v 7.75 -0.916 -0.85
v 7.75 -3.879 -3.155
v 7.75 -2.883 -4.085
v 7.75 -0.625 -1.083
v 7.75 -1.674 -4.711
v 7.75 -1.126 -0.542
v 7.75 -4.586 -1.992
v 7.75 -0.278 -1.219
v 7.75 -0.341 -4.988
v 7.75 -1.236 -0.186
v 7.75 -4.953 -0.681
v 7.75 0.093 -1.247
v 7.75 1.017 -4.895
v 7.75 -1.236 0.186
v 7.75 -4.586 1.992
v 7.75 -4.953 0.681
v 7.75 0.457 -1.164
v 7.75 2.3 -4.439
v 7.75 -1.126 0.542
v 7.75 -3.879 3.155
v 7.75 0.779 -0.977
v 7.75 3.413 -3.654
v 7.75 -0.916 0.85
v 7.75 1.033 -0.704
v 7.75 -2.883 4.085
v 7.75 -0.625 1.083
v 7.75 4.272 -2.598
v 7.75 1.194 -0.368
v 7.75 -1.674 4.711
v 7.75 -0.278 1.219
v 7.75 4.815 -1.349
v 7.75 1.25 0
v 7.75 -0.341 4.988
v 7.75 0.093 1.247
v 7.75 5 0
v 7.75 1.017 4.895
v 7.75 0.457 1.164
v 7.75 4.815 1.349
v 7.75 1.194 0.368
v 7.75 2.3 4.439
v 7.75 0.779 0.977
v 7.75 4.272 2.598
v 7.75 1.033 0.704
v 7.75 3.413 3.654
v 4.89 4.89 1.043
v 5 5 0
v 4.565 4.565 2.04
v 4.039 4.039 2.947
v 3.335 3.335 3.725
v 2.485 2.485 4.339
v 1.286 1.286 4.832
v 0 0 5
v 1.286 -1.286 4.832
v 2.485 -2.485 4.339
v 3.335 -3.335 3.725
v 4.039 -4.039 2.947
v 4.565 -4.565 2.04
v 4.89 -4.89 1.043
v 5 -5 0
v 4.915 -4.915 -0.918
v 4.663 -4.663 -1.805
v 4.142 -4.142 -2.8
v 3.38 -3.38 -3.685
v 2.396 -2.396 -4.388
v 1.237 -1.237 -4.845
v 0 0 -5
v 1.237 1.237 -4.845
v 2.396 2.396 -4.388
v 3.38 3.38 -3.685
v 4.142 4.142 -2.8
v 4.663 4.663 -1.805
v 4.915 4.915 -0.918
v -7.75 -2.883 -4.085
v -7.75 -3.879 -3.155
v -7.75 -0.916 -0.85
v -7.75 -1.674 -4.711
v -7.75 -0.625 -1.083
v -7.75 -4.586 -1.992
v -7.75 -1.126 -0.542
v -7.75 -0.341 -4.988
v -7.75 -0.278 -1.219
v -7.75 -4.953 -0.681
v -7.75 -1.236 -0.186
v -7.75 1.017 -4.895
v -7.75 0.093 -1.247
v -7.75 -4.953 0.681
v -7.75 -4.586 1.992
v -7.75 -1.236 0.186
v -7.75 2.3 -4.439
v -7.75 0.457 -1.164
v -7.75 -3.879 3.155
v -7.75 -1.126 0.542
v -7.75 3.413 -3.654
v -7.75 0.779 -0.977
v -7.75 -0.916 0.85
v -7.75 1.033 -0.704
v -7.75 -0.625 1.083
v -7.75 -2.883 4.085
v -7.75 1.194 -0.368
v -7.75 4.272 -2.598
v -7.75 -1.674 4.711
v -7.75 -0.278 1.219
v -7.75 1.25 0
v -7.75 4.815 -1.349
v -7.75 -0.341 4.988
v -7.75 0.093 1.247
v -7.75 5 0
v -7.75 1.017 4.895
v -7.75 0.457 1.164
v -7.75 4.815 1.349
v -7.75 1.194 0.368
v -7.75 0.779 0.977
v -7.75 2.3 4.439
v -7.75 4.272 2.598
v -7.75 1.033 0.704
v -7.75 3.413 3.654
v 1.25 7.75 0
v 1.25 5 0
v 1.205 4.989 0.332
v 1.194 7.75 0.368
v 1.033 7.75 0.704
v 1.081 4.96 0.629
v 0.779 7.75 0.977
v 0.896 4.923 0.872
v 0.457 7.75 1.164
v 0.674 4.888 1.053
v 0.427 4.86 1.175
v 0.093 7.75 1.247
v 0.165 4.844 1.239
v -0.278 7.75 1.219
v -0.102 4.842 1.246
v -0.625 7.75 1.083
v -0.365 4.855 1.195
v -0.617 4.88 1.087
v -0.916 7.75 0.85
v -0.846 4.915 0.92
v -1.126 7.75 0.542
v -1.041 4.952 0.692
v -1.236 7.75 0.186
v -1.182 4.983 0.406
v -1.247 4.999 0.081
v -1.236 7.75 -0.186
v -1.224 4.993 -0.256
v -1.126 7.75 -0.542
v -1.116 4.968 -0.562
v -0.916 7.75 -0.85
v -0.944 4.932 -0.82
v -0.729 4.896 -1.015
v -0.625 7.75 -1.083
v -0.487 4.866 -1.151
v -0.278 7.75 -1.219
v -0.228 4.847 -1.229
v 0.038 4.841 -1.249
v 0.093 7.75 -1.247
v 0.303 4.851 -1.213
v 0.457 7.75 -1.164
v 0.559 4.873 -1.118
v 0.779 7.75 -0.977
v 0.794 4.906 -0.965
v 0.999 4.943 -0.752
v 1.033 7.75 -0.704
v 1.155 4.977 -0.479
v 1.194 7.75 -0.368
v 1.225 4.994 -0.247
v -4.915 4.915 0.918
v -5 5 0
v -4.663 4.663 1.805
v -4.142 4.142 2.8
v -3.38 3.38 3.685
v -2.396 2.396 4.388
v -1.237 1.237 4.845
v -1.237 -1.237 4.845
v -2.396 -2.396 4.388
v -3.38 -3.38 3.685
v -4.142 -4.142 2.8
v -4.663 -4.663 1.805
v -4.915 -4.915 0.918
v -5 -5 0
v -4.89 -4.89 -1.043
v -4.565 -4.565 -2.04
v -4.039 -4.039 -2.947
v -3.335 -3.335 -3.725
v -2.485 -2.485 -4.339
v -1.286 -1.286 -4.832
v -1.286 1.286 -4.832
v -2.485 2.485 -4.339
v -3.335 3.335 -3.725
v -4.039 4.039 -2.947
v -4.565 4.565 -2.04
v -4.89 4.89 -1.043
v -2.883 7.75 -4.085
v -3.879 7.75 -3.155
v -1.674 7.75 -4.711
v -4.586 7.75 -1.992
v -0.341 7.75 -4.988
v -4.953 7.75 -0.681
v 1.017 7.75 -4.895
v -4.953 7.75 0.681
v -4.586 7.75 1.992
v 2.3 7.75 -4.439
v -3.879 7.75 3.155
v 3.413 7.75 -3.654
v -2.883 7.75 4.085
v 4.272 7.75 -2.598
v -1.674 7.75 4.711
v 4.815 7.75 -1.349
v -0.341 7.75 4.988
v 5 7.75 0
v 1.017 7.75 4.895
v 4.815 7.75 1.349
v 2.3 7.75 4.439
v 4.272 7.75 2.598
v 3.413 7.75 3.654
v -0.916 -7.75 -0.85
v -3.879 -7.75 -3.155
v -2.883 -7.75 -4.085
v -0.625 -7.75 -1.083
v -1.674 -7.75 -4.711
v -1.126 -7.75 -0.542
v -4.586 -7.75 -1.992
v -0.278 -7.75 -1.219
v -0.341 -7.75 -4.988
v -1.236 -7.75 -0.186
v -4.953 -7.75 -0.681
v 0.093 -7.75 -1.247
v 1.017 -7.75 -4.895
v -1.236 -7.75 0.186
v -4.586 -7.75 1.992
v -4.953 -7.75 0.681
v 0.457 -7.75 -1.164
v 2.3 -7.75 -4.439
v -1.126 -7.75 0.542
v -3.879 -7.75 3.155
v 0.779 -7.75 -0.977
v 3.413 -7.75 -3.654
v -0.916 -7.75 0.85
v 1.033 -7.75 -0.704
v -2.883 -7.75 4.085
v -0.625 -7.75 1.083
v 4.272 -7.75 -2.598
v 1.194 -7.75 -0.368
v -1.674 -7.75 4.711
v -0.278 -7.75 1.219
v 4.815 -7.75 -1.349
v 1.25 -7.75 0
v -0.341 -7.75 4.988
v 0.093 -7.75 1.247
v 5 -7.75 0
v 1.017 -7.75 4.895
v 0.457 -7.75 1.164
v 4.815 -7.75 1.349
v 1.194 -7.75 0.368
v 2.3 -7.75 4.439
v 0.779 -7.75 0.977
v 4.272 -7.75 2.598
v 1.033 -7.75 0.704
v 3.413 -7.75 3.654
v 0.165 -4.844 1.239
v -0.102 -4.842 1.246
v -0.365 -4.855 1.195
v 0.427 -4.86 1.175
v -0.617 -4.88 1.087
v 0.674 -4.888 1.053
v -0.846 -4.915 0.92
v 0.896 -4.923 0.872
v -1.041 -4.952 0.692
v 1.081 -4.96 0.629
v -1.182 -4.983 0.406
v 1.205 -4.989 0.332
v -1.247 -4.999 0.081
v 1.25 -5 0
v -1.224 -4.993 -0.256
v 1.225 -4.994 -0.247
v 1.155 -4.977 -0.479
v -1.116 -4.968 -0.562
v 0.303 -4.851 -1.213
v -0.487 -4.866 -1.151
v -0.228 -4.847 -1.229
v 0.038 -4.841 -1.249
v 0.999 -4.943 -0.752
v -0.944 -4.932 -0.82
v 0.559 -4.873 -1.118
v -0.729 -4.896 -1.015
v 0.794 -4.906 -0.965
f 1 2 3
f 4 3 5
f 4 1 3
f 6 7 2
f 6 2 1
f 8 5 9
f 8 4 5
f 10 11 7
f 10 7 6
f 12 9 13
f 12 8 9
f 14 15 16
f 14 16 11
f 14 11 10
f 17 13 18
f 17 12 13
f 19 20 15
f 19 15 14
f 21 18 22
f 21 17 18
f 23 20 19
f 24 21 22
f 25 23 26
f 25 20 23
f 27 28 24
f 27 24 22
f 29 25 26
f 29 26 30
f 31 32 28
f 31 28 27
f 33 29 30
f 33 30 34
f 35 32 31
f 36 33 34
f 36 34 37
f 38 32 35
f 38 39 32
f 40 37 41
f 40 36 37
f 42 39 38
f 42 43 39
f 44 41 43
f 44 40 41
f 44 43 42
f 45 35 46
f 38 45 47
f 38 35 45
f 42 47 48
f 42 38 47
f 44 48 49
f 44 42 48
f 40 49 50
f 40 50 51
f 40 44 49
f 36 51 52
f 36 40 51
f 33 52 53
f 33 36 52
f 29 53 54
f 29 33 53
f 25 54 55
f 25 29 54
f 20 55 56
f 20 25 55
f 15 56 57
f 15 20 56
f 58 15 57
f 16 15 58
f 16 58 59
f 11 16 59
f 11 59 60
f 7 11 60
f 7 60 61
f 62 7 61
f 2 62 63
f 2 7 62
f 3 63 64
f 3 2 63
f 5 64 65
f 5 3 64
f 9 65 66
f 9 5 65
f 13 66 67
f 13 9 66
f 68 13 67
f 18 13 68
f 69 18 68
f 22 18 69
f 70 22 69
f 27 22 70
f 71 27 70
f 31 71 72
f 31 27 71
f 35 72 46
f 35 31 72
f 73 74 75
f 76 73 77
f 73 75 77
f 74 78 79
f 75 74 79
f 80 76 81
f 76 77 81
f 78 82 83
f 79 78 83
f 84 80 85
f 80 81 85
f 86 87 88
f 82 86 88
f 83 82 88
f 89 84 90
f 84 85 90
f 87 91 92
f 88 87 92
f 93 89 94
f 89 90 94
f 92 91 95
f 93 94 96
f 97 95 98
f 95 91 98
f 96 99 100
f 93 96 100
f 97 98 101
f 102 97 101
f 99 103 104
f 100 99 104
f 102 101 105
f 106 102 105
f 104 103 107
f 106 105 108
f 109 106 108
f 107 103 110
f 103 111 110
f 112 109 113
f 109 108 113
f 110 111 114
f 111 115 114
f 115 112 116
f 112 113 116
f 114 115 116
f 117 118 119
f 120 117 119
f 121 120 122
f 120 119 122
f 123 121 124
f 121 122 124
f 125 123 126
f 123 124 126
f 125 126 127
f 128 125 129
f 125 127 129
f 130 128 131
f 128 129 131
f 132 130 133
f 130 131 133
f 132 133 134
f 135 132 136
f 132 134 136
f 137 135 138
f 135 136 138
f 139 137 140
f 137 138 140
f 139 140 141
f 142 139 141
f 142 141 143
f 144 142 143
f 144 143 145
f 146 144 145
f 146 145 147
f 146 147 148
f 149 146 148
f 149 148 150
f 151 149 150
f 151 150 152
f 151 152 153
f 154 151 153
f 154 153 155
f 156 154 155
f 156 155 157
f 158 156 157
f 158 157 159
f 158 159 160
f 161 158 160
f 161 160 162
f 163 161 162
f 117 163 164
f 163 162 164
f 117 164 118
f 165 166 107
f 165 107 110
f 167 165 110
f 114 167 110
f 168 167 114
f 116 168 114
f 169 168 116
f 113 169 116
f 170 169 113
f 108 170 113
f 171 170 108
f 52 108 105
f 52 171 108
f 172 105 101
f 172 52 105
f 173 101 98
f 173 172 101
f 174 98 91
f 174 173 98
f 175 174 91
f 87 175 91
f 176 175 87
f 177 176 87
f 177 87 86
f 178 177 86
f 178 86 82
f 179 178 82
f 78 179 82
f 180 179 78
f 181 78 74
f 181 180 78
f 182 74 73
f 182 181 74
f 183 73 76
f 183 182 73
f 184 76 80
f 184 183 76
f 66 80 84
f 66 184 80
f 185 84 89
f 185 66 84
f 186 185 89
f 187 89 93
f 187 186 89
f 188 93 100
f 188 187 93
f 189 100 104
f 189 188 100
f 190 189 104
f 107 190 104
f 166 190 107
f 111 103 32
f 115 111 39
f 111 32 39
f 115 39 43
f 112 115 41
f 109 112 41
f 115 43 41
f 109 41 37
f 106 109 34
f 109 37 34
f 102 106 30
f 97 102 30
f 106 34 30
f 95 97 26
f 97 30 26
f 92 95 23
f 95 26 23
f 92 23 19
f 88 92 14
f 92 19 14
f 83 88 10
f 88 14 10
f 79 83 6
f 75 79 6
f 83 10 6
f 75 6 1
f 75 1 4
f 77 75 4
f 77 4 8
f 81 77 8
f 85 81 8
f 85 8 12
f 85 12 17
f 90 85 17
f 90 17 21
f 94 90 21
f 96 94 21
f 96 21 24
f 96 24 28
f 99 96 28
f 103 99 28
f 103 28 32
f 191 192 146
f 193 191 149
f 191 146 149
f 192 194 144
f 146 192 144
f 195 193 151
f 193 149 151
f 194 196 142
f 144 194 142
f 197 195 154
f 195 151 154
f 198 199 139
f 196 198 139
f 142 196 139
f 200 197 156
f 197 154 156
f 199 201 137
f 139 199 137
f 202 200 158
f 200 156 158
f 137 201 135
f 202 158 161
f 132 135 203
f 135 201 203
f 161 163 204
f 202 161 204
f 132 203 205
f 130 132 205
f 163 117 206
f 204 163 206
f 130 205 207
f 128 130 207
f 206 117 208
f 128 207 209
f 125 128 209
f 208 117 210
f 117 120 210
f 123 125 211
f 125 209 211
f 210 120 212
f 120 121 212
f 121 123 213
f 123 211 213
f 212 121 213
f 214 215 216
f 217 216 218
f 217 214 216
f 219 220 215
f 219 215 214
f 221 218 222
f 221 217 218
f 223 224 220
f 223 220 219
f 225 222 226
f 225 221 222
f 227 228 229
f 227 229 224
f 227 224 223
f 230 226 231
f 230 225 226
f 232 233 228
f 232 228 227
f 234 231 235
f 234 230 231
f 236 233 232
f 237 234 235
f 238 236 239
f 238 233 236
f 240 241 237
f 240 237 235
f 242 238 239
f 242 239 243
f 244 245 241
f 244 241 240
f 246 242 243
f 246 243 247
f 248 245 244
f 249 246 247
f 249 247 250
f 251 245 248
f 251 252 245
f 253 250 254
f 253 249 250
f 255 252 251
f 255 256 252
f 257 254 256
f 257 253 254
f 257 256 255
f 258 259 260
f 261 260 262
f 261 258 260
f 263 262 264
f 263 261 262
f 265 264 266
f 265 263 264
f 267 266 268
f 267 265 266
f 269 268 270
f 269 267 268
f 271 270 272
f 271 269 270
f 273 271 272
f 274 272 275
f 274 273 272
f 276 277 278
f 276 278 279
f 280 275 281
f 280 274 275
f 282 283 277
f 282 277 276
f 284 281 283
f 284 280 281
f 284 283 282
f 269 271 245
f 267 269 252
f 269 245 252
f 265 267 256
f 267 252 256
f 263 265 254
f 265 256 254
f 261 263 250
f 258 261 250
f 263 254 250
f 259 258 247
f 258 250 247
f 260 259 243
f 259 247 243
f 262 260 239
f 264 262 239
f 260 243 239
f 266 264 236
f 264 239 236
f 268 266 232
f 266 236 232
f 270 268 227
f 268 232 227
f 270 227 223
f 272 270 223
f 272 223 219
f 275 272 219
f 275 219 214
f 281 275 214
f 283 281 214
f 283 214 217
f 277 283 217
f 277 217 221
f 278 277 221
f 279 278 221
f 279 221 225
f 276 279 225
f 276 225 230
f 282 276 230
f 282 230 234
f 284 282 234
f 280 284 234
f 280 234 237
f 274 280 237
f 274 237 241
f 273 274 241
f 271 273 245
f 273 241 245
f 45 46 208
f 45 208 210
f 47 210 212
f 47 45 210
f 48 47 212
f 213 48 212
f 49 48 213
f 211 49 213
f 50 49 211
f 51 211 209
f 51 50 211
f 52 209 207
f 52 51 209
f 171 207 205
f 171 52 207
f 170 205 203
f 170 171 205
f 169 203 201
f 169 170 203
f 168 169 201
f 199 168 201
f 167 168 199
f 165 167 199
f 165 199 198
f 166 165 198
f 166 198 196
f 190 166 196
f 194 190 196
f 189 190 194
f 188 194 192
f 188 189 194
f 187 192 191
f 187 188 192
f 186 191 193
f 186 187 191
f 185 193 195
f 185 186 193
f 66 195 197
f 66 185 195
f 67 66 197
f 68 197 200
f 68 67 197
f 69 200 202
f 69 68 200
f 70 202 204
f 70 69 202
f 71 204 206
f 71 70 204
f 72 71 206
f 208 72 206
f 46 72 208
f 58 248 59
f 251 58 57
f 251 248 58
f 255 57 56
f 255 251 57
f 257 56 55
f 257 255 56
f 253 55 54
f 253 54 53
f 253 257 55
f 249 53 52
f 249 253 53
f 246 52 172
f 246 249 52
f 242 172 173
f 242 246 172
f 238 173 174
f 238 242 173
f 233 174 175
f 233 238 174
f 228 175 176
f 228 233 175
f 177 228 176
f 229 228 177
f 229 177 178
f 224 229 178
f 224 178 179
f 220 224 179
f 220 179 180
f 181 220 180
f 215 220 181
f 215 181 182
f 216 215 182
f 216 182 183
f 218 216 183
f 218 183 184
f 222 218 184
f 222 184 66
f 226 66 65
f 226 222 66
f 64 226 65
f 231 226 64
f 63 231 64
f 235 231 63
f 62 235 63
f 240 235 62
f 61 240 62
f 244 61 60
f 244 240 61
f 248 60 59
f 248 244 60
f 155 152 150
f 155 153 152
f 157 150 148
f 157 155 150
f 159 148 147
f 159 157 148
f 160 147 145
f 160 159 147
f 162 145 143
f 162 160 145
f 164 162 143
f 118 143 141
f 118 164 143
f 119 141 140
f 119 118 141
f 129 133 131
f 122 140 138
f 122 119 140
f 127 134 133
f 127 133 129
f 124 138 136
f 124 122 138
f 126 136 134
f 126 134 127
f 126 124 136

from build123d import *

# Parameters (mm, degrees)
F0_R     = 5
F1_DEPTH = 7.75
F2_R     = 1.25
F3_DEPTH = 25
F4_R     = 5
F5_DEPTH = 7.75
F6_R     = 1.25
F7_DEPTH = 25


with BuildPart() as f1:
    # F0 (on Front) → F1 (new body, symmetric)
    with BuildSketch(Plane.XZ):
        Circle(F0_R)
    extrude(amount=F1_DEPTH, both=True)

    # F2 (on face) → F3 (cut)
    with BuildSketch(Plane.XZ.offset(7.75)):
        Circle(F2_R)
    extrude(amount=-F3_DEPTH, mode=Mode.SUBTRACT)

    # F4 (on Right) → F5 (join, symmetric)
    with BuildSketch(Plane.YZ):
        Circle(F4_R)
    extrude(amount=F5_DEPTH, both=True)

    # F6 (on face) → F7 (cut)
    with BuildSketch(Plane.YZ.offset(7.75)):
        Circle(F6_R)
    extrude(amount=-F7_DEPTH, mode=Mode.SUBTRACT)


solid = f1.part
